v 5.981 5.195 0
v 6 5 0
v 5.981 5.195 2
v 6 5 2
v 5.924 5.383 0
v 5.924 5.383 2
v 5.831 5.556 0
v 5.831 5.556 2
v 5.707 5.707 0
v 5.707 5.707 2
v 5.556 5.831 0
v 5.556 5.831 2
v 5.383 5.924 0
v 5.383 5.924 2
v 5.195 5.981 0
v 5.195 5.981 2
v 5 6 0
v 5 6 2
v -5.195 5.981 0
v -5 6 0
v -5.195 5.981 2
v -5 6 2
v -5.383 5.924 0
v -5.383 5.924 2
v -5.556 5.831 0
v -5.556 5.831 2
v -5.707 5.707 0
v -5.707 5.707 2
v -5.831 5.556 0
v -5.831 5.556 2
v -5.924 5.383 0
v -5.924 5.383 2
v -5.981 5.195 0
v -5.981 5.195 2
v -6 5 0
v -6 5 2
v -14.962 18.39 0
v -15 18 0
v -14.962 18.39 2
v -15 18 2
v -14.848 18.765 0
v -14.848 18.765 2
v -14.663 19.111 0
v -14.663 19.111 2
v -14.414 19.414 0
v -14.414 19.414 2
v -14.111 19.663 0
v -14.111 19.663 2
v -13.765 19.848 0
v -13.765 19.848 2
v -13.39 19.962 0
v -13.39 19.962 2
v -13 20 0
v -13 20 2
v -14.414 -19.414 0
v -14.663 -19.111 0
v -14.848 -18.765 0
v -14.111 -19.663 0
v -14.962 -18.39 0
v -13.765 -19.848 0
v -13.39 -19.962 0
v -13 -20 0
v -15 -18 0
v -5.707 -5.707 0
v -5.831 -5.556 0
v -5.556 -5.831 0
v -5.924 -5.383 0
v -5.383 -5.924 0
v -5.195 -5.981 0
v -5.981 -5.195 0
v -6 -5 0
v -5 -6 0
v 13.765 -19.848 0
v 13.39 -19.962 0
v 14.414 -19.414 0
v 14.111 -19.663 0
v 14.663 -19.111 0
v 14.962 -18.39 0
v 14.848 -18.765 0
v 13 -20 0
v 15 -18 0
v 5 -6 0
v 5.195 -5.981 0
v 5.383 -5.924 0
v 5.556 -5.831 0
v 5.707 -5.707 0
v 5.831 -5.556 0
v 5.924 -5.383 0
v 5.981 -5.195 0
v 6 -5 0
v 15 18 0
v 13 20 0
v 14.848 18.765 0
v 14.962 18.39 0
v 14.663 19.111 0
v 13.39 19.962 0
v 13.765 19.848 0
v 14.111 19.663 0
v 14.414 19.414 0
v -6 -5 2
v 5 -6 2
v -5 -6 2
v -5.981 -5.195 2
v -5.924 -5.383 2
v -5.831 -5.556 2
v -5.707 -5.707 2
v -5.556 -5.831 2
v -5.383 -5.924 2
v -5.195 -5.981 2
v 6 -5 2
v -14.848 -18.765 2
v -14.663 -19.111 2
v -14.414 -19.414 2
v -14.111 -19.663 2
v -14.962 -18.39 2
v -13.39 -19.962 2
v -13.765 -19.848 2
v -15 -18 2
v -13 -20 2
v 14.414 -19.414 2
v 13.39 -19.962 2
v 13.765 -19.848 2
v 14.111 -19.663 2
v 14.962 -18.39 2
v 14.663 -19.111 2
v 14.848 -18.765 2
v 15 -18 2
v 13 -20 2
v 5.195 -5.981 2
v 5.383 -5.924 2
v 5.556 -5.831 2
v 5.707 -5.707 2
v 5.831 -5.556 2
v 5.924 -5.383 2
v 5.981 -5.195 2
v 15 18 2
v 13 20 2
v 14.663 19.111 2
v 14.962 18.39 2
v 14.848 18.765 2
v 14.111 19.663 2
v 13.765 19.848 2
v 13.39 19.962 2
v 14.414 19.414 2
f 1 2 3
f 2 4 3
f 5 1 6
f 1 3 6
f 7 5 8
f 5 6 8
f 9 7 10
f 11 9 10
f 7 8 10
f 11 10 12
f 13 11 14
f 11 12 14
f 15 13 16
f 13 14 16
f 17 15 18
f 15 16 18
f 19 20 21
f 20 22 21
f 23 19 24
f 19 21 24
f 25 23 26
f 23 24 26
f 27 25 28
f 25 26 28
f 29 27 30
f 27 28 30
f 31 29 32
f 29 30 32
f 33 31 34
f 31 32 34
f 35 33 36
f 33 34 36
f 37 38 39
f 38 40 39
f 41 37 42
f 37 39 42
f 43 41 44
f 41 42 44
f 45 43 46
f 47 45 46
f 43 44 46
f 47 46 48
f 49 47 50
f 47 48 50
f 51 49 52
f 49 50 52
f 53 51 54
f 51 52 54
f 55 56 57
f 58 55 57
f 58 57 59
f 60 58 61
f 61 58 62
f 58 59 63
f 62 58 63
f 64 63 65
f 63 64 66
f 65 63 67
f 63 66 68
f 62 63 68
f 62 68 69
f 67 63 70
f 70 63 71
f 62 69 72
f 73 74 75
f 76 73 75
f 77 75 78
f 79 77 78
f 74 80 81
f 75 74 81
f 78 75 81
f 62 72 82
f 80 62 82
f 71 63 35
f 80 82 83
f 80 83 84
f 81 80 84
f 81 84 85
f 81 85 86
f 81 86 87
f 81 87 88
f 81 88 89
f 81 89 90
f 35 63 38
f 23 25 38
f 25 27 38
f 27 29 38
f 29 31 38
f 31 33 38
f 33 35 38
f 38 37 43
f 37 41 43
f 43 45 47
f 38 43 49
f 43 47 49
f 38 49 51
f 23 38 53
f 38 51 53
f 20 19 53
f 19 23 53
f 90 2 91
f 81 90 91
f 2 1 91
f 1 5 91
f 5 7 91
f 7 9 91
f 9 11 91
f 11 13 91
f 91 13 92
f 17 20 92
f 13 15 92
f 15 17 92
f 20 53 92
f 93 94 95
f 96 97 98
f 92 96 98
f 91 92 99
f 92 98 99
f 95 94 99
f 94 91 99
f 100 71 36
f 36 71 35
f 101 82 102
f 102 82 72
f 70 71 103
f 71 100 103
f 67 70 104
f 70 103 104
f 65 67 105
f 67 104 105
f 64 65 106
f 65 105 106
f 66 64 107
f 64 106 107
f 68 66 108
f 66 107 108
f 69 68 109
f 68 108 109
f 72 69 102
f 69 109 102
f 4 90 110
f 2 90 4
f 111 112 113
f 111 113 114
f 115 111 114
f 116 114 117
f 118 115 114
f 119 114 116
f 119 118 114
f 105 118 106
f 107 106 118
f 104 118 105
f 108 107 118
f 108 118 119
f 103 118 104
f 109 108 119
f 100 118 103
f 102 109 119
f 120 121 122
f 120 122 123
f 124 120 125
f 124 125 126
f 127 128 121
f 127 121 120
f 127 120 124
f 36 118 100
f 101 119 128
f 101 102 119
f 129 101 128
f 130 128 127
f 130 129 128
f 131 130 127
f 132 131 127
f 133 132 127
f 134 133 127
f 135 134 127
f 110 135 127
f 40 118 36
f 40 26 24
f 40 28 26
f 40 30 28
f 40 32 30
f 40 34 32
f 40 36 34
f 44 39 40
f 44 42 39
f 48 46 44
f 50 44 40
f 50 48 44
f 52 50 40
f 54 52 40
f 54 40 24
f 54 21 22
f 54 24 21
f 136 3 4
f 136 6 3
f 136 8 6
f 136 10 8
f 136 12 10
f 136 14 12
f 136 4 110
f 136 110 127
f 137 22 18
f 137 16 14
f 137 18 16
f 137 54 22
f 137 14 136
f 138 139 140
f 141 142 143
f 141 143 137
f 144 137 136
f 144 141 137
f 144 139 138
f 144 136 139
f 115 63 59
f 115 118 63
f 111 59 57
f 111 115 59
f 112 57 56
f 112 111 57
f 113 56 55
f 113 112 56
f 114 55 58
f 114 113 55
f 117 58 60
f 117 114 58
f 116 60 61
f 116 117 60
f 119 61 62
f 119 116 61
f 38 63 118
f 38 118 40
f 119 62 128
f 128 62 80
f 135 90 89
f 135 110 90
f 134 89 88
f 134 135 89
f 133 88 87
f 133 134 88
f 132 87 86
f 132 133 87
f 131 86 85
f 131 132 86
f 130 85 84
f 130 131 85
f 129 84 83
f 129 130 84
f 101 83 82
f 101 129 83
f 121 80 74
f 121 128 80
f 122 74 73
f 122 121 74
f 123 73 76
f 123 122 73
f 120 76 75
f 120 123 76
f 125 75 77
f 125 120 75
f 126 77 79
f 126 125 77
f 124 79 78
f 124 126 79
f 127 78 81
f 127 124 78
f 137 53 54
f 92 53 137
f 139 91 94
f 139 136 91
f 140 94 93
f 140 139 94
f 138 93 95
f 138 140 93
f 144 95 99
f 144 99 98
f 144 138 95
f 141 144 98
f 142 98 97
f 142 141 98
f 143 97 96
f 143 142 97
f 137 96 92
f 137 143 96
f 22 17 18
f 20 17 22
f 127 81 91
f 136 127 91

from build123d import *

# Parameters (mm, degrees)
ESQUISSE1_W             = 30
ESQUISSE1_H             = 40
BOSS_EXTRU_1_DEPTH      = 2
CONG_1_R                = 2
ESQUISSE3_W             = 12
ESQUISSE3_H             = 12
ENL_V_MAT_EXTRU_1_DEPTH = 10
CONG_2_R                = 1


with BuildPart() as part:
    # Esquisse1 → Boss.-Extru.1 (new body)
    with BuildSketch(Plane.XY):
        Rectangle(ESQUISSE1_W, ESQUISSE1_H)
    extrude(amount=BOSS_EXTRU_1_DEPTH)

    # Congé1
    cong_1_edges = [part.edges().sort_by_distance(p)[0] for p in [
        (15, -20, 1),
        (-15, -20, 1),
        (-15, 20, 1),
        (15, 20, 1),
    ]]
    fillet(cong_1_edges, radius=CONG_1_R)

    # Esquisse3 → Enlèv. mat.-Extru.1 (cut)
    with BuildSketch(Plane(origin=(0, 0, 0), x_dir=(-1, 0, 0), z_dir=(0, 0, -1))):
        Rectangle(ESQUISSE3_W, ESQUISSE3_H)
    extrude(amount=-ENL_V_MAT_EXTRU_1_DEPTH, mode=Mode.SUBTRACT)

    # Congé2
    cong_2_edges = [part.edges().sort_by_distance(p)[0] for p in [
        (-6, 6, 1),
        (-6, -6, 1),
        (6, -6, 1),
        (6, 6, 1),
    ]]
    fillet(cong_2_edges, radius=CONG_2_R)


solid = part.part
